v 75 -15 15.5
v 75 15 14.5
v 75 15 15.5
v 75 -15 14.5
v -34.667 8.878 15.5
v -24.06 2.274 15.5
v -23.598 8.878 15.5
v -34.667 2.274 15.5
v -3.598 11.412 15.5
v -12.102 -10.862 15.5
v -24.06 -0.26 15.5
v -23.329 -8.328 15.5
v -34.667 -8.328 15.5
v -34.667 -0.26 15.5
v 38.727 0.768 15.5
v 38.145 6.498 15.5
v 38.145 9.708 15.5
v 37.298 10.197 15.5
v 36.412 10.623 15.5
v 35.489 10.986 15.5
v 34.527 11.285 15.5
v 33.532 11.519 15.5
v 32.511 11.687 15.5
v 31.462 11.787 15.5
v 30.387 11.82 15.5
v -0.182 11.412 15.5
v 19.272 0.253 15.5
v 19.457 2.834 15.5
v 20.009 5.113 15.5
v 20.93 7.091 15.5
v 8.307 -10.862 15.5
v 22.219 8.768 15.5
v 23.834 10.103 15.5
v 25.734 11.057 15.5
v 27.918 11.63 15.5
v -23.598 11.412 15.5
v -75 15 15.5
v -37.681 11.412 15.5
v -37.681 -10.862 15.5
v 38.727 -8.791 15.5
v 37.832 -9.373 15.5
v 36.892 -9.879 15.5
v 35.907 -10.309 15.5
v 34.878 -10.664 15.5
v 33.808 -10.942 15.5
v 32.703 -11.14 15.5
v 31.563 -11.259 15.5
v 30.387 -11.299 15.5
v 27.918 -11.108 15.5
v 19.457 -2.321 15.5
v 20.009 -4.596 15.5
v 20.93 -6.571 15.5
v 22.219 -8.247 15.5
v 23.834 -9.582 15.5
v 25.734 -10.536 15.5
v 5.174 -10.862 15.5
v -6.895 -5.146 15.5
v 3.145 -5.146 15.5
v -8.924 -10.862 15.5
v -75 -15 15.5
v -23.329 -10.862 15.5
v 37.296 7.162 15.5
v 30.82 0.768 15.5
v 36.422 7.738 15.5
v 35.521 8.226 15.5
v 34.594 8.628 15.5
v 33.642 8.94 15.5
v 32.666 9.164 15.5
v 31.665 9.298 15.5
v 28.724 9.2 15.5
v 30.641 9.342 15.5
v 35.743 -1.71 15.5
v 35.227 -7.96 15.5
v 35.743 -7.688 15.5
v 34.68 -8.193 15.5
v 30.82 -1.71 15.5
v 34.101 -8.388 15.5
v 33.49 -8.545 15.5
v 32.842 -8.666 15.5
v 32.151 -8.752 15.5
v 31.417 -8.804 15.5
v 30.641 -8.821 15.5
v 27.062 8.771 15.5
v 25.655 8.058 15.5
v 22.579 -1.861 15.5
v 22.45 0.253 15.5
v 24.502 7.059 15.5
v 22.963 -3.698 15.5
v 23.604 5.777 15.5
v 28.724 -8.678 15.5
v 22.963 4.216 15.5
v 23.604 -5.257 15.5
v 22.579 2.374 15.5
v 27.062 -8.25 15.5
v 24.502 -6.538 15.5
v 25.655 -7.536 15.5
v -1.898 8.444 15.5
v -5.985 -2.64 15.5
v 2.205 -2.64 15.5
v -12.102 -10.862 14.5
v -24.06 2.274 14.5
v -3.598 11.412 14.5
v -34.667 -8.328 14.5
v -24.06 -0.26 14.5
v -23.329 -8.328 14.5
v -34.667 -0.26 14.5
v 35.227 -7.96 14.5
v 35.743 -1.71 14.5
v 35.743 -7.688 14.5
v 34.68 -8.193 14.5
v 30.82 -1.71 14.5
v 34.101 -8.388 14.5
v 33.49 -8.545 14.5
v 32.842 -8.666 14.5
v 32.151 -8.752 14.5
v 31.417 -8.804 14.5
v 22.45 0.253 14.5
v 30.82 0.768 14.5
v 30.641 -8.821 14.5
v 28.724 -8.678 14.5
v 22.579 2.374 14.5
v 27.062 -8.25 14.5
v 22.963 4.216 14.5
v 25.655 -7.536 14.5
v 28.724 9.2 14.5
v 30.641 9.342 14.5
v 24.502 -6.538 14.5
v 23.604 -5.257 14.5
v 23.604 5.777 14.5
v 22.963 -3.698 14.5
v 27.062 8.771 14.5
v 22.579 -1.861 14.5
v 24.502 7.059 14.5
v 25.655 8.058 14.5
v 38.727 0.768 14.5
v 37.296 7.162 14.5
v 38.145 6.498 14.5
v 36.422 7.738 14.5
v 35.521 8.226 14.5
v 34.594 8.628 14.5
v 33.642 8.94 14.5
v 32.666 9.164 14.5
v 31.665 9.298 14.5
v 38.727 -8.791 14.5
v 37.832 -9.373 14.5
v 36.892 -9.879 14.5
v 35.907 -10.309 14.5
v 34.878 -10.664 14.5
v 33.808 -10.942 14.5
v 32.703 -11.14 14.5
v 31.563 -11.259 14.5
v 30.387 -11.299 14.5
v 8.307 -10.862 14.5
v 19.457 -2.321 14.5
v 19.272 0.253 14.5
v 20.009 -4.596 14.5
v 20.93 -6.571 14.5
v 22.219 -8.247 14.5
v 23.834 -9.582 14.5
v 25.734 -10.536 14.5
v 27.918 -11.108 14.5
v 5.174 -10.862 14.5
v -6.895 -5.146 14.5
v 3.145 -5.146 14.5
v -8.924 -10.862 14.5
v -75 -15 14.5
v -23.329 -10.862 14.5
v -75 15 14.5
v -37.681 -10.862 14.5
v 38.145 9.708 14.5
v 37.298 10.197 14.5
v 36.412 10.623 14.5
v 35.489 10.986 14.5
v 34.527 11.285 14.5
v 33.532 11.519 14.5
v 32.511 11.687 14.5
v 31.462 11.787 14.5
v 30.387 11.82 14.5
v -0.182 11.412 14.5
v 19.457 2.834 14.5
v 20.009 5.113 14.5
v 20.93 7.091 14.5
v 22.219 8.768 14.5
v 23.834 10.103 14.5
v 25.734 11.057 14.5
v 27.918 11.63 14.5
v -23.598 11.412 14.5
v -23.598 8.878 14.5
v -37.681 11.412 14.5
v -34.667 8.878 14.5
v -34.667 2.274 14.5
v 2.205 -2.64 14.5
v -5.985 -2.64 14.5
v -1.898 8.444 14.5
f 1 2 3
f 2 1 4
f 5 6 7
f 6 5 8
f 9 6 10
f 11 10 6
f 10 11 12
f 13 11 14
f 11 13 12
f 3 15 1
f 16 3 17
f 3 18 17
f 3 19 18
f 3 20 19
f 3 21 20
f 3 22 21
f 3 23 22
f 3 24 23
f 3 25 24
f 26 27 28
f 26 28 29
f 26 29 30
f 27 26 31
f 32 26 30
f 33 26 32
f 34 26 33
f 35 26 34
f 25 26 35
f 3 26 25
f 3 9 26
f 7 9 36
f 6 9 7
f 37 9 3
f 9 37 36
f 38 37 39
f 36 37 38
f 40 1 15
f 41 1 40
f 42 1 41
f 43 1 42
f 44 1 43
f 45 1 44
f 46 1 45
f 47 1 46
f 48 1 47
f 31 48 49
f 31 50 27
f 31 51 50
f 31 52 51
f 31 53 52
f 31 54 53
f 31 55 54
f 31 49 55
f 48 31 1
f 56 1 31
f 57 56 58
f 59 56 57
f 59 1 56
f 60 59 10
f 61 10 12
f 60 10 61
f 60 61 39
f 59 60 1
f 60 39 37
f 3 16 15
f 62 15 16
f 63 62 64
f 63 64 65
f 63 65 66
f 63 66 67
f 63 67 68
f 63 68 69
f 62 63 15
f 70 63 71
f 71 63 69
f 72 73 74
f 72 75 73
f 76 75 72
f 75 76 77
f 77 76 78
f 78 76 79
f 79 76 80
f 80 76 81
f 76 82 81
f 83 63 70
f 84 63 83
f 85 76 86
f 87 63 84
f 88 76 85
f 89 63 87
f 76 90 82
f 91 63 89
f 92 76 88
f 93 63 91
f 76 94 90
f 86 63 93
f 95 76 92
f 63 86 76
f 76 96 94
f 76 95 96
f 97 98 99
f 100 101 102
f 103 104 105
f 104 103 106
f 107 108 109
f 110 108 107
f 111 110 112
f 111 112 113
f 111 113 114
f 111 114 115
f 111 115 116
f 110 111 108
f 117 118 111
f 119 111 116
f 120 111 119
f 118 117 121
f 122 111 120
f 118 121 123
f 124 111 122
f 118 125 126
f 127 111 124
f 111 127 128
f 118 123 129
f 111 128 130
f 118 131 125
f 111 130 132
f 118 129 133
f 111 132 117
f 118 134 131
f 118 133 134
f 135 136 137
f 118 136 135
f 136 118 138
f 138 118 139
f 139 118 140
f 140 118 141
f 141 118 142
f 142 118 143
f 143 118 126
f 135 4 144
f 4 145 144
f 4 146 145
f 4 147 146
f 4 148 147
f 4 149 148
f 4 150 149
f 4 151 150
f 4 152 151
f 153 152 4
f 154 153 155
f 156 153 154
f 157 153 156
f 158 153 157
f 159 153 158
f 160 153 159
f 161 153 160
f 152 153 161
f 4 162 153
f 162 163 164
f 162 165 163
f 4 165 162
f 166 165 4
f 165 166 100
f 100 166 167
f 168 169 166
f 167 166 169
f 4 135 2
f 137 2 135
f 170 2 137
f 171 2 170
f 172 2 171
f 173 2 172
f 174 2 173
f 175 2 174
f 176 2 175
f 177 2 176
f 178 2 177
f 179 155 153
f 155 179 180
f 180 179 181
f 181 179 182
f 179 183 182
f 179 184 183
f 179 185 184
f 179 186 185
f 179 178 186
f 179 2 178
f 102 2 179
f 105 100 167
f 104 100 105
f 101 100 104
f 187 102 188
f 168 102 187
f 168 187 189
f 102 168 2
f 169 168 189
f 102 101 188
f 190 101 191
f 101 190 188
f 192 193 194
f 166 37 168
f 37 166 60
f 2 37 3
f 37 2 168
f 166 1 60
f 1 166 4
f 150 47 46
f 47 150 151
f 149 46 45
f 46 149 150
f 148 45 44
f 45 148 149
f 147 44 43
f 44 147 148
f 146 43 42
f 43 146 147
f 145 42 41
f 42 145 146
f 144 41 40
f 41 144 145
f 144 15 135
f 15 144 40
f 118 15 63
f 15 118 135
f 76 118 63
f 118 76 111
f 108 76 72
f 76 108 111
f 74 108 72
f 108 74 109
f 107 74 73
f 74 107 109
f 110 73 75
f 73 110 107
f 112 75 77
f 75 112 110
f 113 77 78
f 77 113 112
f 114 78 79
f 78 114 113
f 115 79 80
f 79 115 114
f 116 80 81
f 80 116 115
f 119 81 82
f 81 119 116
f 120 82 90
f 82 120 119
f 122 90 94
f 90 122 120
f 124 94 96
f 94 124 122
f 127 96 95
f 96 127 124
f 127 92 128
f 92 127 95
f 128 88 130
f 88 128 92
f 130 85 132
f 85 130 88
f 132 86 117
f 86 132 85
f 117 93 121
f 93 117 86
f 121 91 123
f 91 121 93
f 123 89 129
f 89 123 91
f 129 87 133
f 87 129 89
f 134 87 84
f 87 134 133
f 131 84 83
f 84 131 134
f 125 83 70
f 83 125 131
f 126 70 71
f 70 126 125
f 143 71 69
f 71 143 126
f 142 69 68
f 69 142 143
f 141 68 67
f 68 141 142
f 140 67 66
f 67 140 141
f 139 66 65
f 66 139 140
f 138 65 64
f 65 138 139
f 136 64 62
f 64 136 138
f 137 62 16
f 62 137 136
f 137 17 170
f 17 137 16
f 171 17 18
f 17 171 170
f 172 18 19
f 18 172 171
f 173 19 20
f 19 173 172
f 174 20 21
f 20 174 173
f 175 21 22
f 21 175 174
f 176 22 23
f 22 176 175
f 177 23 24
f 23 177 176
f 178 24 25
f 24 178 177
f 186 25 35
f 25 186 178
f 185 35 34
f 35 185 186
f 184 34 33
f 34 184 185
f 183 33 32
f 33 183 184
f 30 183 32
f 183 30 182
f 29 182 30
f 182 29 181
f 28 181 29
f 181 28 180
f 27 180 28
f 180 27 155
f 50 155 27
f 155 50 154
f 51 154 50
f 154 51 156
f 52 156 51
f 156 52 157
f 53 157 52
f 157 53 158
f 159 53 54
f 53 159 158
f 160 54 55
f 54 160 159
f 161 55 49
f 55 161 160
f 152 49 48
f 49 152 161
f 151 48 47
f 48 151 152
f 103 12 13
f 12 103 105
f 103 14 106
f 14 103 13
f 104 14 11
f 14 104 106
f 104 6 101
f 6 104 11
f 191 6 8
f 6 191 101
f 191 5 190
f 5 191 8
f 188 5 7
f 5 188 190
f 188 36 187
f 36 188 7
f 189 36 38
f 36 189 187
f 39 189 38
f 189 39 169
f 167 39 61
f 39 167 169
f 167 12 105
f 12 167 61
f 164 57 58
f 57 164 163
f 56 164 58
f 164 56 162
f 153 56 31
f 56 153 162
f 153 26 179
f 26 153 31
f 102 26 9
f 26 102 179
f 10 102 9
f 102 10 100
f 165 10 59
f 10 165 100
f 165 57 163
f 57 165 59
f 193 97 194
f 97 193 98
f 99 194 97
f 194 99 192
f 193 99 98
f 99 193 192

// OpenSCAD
// LetterBlock.scad - Basic usage of text() and linear_extrude()

// Module instantiation
LetterBlock("E A G");

// Module definition.
// size=30 defines an optional parameter with a default value.
module LetterBlock(letter, size=30) {
    boxlength = size * len(letter);
    difference() {
        translate([0,0,size/2]) cube([boxlength,size,1], center=true);
        translate([0,0,-size/2]) {
            // convexity is needed for correct preview
            // since characters can be highly concave
            linear_extrude(height=size*2, convexity=4)
                text(letter, 
                     size=size*22/30,
                     font="Stencil Time:style=Regular",
                     halign="center",
                     valign="center");
        }
    }
}

echo(version=version());
